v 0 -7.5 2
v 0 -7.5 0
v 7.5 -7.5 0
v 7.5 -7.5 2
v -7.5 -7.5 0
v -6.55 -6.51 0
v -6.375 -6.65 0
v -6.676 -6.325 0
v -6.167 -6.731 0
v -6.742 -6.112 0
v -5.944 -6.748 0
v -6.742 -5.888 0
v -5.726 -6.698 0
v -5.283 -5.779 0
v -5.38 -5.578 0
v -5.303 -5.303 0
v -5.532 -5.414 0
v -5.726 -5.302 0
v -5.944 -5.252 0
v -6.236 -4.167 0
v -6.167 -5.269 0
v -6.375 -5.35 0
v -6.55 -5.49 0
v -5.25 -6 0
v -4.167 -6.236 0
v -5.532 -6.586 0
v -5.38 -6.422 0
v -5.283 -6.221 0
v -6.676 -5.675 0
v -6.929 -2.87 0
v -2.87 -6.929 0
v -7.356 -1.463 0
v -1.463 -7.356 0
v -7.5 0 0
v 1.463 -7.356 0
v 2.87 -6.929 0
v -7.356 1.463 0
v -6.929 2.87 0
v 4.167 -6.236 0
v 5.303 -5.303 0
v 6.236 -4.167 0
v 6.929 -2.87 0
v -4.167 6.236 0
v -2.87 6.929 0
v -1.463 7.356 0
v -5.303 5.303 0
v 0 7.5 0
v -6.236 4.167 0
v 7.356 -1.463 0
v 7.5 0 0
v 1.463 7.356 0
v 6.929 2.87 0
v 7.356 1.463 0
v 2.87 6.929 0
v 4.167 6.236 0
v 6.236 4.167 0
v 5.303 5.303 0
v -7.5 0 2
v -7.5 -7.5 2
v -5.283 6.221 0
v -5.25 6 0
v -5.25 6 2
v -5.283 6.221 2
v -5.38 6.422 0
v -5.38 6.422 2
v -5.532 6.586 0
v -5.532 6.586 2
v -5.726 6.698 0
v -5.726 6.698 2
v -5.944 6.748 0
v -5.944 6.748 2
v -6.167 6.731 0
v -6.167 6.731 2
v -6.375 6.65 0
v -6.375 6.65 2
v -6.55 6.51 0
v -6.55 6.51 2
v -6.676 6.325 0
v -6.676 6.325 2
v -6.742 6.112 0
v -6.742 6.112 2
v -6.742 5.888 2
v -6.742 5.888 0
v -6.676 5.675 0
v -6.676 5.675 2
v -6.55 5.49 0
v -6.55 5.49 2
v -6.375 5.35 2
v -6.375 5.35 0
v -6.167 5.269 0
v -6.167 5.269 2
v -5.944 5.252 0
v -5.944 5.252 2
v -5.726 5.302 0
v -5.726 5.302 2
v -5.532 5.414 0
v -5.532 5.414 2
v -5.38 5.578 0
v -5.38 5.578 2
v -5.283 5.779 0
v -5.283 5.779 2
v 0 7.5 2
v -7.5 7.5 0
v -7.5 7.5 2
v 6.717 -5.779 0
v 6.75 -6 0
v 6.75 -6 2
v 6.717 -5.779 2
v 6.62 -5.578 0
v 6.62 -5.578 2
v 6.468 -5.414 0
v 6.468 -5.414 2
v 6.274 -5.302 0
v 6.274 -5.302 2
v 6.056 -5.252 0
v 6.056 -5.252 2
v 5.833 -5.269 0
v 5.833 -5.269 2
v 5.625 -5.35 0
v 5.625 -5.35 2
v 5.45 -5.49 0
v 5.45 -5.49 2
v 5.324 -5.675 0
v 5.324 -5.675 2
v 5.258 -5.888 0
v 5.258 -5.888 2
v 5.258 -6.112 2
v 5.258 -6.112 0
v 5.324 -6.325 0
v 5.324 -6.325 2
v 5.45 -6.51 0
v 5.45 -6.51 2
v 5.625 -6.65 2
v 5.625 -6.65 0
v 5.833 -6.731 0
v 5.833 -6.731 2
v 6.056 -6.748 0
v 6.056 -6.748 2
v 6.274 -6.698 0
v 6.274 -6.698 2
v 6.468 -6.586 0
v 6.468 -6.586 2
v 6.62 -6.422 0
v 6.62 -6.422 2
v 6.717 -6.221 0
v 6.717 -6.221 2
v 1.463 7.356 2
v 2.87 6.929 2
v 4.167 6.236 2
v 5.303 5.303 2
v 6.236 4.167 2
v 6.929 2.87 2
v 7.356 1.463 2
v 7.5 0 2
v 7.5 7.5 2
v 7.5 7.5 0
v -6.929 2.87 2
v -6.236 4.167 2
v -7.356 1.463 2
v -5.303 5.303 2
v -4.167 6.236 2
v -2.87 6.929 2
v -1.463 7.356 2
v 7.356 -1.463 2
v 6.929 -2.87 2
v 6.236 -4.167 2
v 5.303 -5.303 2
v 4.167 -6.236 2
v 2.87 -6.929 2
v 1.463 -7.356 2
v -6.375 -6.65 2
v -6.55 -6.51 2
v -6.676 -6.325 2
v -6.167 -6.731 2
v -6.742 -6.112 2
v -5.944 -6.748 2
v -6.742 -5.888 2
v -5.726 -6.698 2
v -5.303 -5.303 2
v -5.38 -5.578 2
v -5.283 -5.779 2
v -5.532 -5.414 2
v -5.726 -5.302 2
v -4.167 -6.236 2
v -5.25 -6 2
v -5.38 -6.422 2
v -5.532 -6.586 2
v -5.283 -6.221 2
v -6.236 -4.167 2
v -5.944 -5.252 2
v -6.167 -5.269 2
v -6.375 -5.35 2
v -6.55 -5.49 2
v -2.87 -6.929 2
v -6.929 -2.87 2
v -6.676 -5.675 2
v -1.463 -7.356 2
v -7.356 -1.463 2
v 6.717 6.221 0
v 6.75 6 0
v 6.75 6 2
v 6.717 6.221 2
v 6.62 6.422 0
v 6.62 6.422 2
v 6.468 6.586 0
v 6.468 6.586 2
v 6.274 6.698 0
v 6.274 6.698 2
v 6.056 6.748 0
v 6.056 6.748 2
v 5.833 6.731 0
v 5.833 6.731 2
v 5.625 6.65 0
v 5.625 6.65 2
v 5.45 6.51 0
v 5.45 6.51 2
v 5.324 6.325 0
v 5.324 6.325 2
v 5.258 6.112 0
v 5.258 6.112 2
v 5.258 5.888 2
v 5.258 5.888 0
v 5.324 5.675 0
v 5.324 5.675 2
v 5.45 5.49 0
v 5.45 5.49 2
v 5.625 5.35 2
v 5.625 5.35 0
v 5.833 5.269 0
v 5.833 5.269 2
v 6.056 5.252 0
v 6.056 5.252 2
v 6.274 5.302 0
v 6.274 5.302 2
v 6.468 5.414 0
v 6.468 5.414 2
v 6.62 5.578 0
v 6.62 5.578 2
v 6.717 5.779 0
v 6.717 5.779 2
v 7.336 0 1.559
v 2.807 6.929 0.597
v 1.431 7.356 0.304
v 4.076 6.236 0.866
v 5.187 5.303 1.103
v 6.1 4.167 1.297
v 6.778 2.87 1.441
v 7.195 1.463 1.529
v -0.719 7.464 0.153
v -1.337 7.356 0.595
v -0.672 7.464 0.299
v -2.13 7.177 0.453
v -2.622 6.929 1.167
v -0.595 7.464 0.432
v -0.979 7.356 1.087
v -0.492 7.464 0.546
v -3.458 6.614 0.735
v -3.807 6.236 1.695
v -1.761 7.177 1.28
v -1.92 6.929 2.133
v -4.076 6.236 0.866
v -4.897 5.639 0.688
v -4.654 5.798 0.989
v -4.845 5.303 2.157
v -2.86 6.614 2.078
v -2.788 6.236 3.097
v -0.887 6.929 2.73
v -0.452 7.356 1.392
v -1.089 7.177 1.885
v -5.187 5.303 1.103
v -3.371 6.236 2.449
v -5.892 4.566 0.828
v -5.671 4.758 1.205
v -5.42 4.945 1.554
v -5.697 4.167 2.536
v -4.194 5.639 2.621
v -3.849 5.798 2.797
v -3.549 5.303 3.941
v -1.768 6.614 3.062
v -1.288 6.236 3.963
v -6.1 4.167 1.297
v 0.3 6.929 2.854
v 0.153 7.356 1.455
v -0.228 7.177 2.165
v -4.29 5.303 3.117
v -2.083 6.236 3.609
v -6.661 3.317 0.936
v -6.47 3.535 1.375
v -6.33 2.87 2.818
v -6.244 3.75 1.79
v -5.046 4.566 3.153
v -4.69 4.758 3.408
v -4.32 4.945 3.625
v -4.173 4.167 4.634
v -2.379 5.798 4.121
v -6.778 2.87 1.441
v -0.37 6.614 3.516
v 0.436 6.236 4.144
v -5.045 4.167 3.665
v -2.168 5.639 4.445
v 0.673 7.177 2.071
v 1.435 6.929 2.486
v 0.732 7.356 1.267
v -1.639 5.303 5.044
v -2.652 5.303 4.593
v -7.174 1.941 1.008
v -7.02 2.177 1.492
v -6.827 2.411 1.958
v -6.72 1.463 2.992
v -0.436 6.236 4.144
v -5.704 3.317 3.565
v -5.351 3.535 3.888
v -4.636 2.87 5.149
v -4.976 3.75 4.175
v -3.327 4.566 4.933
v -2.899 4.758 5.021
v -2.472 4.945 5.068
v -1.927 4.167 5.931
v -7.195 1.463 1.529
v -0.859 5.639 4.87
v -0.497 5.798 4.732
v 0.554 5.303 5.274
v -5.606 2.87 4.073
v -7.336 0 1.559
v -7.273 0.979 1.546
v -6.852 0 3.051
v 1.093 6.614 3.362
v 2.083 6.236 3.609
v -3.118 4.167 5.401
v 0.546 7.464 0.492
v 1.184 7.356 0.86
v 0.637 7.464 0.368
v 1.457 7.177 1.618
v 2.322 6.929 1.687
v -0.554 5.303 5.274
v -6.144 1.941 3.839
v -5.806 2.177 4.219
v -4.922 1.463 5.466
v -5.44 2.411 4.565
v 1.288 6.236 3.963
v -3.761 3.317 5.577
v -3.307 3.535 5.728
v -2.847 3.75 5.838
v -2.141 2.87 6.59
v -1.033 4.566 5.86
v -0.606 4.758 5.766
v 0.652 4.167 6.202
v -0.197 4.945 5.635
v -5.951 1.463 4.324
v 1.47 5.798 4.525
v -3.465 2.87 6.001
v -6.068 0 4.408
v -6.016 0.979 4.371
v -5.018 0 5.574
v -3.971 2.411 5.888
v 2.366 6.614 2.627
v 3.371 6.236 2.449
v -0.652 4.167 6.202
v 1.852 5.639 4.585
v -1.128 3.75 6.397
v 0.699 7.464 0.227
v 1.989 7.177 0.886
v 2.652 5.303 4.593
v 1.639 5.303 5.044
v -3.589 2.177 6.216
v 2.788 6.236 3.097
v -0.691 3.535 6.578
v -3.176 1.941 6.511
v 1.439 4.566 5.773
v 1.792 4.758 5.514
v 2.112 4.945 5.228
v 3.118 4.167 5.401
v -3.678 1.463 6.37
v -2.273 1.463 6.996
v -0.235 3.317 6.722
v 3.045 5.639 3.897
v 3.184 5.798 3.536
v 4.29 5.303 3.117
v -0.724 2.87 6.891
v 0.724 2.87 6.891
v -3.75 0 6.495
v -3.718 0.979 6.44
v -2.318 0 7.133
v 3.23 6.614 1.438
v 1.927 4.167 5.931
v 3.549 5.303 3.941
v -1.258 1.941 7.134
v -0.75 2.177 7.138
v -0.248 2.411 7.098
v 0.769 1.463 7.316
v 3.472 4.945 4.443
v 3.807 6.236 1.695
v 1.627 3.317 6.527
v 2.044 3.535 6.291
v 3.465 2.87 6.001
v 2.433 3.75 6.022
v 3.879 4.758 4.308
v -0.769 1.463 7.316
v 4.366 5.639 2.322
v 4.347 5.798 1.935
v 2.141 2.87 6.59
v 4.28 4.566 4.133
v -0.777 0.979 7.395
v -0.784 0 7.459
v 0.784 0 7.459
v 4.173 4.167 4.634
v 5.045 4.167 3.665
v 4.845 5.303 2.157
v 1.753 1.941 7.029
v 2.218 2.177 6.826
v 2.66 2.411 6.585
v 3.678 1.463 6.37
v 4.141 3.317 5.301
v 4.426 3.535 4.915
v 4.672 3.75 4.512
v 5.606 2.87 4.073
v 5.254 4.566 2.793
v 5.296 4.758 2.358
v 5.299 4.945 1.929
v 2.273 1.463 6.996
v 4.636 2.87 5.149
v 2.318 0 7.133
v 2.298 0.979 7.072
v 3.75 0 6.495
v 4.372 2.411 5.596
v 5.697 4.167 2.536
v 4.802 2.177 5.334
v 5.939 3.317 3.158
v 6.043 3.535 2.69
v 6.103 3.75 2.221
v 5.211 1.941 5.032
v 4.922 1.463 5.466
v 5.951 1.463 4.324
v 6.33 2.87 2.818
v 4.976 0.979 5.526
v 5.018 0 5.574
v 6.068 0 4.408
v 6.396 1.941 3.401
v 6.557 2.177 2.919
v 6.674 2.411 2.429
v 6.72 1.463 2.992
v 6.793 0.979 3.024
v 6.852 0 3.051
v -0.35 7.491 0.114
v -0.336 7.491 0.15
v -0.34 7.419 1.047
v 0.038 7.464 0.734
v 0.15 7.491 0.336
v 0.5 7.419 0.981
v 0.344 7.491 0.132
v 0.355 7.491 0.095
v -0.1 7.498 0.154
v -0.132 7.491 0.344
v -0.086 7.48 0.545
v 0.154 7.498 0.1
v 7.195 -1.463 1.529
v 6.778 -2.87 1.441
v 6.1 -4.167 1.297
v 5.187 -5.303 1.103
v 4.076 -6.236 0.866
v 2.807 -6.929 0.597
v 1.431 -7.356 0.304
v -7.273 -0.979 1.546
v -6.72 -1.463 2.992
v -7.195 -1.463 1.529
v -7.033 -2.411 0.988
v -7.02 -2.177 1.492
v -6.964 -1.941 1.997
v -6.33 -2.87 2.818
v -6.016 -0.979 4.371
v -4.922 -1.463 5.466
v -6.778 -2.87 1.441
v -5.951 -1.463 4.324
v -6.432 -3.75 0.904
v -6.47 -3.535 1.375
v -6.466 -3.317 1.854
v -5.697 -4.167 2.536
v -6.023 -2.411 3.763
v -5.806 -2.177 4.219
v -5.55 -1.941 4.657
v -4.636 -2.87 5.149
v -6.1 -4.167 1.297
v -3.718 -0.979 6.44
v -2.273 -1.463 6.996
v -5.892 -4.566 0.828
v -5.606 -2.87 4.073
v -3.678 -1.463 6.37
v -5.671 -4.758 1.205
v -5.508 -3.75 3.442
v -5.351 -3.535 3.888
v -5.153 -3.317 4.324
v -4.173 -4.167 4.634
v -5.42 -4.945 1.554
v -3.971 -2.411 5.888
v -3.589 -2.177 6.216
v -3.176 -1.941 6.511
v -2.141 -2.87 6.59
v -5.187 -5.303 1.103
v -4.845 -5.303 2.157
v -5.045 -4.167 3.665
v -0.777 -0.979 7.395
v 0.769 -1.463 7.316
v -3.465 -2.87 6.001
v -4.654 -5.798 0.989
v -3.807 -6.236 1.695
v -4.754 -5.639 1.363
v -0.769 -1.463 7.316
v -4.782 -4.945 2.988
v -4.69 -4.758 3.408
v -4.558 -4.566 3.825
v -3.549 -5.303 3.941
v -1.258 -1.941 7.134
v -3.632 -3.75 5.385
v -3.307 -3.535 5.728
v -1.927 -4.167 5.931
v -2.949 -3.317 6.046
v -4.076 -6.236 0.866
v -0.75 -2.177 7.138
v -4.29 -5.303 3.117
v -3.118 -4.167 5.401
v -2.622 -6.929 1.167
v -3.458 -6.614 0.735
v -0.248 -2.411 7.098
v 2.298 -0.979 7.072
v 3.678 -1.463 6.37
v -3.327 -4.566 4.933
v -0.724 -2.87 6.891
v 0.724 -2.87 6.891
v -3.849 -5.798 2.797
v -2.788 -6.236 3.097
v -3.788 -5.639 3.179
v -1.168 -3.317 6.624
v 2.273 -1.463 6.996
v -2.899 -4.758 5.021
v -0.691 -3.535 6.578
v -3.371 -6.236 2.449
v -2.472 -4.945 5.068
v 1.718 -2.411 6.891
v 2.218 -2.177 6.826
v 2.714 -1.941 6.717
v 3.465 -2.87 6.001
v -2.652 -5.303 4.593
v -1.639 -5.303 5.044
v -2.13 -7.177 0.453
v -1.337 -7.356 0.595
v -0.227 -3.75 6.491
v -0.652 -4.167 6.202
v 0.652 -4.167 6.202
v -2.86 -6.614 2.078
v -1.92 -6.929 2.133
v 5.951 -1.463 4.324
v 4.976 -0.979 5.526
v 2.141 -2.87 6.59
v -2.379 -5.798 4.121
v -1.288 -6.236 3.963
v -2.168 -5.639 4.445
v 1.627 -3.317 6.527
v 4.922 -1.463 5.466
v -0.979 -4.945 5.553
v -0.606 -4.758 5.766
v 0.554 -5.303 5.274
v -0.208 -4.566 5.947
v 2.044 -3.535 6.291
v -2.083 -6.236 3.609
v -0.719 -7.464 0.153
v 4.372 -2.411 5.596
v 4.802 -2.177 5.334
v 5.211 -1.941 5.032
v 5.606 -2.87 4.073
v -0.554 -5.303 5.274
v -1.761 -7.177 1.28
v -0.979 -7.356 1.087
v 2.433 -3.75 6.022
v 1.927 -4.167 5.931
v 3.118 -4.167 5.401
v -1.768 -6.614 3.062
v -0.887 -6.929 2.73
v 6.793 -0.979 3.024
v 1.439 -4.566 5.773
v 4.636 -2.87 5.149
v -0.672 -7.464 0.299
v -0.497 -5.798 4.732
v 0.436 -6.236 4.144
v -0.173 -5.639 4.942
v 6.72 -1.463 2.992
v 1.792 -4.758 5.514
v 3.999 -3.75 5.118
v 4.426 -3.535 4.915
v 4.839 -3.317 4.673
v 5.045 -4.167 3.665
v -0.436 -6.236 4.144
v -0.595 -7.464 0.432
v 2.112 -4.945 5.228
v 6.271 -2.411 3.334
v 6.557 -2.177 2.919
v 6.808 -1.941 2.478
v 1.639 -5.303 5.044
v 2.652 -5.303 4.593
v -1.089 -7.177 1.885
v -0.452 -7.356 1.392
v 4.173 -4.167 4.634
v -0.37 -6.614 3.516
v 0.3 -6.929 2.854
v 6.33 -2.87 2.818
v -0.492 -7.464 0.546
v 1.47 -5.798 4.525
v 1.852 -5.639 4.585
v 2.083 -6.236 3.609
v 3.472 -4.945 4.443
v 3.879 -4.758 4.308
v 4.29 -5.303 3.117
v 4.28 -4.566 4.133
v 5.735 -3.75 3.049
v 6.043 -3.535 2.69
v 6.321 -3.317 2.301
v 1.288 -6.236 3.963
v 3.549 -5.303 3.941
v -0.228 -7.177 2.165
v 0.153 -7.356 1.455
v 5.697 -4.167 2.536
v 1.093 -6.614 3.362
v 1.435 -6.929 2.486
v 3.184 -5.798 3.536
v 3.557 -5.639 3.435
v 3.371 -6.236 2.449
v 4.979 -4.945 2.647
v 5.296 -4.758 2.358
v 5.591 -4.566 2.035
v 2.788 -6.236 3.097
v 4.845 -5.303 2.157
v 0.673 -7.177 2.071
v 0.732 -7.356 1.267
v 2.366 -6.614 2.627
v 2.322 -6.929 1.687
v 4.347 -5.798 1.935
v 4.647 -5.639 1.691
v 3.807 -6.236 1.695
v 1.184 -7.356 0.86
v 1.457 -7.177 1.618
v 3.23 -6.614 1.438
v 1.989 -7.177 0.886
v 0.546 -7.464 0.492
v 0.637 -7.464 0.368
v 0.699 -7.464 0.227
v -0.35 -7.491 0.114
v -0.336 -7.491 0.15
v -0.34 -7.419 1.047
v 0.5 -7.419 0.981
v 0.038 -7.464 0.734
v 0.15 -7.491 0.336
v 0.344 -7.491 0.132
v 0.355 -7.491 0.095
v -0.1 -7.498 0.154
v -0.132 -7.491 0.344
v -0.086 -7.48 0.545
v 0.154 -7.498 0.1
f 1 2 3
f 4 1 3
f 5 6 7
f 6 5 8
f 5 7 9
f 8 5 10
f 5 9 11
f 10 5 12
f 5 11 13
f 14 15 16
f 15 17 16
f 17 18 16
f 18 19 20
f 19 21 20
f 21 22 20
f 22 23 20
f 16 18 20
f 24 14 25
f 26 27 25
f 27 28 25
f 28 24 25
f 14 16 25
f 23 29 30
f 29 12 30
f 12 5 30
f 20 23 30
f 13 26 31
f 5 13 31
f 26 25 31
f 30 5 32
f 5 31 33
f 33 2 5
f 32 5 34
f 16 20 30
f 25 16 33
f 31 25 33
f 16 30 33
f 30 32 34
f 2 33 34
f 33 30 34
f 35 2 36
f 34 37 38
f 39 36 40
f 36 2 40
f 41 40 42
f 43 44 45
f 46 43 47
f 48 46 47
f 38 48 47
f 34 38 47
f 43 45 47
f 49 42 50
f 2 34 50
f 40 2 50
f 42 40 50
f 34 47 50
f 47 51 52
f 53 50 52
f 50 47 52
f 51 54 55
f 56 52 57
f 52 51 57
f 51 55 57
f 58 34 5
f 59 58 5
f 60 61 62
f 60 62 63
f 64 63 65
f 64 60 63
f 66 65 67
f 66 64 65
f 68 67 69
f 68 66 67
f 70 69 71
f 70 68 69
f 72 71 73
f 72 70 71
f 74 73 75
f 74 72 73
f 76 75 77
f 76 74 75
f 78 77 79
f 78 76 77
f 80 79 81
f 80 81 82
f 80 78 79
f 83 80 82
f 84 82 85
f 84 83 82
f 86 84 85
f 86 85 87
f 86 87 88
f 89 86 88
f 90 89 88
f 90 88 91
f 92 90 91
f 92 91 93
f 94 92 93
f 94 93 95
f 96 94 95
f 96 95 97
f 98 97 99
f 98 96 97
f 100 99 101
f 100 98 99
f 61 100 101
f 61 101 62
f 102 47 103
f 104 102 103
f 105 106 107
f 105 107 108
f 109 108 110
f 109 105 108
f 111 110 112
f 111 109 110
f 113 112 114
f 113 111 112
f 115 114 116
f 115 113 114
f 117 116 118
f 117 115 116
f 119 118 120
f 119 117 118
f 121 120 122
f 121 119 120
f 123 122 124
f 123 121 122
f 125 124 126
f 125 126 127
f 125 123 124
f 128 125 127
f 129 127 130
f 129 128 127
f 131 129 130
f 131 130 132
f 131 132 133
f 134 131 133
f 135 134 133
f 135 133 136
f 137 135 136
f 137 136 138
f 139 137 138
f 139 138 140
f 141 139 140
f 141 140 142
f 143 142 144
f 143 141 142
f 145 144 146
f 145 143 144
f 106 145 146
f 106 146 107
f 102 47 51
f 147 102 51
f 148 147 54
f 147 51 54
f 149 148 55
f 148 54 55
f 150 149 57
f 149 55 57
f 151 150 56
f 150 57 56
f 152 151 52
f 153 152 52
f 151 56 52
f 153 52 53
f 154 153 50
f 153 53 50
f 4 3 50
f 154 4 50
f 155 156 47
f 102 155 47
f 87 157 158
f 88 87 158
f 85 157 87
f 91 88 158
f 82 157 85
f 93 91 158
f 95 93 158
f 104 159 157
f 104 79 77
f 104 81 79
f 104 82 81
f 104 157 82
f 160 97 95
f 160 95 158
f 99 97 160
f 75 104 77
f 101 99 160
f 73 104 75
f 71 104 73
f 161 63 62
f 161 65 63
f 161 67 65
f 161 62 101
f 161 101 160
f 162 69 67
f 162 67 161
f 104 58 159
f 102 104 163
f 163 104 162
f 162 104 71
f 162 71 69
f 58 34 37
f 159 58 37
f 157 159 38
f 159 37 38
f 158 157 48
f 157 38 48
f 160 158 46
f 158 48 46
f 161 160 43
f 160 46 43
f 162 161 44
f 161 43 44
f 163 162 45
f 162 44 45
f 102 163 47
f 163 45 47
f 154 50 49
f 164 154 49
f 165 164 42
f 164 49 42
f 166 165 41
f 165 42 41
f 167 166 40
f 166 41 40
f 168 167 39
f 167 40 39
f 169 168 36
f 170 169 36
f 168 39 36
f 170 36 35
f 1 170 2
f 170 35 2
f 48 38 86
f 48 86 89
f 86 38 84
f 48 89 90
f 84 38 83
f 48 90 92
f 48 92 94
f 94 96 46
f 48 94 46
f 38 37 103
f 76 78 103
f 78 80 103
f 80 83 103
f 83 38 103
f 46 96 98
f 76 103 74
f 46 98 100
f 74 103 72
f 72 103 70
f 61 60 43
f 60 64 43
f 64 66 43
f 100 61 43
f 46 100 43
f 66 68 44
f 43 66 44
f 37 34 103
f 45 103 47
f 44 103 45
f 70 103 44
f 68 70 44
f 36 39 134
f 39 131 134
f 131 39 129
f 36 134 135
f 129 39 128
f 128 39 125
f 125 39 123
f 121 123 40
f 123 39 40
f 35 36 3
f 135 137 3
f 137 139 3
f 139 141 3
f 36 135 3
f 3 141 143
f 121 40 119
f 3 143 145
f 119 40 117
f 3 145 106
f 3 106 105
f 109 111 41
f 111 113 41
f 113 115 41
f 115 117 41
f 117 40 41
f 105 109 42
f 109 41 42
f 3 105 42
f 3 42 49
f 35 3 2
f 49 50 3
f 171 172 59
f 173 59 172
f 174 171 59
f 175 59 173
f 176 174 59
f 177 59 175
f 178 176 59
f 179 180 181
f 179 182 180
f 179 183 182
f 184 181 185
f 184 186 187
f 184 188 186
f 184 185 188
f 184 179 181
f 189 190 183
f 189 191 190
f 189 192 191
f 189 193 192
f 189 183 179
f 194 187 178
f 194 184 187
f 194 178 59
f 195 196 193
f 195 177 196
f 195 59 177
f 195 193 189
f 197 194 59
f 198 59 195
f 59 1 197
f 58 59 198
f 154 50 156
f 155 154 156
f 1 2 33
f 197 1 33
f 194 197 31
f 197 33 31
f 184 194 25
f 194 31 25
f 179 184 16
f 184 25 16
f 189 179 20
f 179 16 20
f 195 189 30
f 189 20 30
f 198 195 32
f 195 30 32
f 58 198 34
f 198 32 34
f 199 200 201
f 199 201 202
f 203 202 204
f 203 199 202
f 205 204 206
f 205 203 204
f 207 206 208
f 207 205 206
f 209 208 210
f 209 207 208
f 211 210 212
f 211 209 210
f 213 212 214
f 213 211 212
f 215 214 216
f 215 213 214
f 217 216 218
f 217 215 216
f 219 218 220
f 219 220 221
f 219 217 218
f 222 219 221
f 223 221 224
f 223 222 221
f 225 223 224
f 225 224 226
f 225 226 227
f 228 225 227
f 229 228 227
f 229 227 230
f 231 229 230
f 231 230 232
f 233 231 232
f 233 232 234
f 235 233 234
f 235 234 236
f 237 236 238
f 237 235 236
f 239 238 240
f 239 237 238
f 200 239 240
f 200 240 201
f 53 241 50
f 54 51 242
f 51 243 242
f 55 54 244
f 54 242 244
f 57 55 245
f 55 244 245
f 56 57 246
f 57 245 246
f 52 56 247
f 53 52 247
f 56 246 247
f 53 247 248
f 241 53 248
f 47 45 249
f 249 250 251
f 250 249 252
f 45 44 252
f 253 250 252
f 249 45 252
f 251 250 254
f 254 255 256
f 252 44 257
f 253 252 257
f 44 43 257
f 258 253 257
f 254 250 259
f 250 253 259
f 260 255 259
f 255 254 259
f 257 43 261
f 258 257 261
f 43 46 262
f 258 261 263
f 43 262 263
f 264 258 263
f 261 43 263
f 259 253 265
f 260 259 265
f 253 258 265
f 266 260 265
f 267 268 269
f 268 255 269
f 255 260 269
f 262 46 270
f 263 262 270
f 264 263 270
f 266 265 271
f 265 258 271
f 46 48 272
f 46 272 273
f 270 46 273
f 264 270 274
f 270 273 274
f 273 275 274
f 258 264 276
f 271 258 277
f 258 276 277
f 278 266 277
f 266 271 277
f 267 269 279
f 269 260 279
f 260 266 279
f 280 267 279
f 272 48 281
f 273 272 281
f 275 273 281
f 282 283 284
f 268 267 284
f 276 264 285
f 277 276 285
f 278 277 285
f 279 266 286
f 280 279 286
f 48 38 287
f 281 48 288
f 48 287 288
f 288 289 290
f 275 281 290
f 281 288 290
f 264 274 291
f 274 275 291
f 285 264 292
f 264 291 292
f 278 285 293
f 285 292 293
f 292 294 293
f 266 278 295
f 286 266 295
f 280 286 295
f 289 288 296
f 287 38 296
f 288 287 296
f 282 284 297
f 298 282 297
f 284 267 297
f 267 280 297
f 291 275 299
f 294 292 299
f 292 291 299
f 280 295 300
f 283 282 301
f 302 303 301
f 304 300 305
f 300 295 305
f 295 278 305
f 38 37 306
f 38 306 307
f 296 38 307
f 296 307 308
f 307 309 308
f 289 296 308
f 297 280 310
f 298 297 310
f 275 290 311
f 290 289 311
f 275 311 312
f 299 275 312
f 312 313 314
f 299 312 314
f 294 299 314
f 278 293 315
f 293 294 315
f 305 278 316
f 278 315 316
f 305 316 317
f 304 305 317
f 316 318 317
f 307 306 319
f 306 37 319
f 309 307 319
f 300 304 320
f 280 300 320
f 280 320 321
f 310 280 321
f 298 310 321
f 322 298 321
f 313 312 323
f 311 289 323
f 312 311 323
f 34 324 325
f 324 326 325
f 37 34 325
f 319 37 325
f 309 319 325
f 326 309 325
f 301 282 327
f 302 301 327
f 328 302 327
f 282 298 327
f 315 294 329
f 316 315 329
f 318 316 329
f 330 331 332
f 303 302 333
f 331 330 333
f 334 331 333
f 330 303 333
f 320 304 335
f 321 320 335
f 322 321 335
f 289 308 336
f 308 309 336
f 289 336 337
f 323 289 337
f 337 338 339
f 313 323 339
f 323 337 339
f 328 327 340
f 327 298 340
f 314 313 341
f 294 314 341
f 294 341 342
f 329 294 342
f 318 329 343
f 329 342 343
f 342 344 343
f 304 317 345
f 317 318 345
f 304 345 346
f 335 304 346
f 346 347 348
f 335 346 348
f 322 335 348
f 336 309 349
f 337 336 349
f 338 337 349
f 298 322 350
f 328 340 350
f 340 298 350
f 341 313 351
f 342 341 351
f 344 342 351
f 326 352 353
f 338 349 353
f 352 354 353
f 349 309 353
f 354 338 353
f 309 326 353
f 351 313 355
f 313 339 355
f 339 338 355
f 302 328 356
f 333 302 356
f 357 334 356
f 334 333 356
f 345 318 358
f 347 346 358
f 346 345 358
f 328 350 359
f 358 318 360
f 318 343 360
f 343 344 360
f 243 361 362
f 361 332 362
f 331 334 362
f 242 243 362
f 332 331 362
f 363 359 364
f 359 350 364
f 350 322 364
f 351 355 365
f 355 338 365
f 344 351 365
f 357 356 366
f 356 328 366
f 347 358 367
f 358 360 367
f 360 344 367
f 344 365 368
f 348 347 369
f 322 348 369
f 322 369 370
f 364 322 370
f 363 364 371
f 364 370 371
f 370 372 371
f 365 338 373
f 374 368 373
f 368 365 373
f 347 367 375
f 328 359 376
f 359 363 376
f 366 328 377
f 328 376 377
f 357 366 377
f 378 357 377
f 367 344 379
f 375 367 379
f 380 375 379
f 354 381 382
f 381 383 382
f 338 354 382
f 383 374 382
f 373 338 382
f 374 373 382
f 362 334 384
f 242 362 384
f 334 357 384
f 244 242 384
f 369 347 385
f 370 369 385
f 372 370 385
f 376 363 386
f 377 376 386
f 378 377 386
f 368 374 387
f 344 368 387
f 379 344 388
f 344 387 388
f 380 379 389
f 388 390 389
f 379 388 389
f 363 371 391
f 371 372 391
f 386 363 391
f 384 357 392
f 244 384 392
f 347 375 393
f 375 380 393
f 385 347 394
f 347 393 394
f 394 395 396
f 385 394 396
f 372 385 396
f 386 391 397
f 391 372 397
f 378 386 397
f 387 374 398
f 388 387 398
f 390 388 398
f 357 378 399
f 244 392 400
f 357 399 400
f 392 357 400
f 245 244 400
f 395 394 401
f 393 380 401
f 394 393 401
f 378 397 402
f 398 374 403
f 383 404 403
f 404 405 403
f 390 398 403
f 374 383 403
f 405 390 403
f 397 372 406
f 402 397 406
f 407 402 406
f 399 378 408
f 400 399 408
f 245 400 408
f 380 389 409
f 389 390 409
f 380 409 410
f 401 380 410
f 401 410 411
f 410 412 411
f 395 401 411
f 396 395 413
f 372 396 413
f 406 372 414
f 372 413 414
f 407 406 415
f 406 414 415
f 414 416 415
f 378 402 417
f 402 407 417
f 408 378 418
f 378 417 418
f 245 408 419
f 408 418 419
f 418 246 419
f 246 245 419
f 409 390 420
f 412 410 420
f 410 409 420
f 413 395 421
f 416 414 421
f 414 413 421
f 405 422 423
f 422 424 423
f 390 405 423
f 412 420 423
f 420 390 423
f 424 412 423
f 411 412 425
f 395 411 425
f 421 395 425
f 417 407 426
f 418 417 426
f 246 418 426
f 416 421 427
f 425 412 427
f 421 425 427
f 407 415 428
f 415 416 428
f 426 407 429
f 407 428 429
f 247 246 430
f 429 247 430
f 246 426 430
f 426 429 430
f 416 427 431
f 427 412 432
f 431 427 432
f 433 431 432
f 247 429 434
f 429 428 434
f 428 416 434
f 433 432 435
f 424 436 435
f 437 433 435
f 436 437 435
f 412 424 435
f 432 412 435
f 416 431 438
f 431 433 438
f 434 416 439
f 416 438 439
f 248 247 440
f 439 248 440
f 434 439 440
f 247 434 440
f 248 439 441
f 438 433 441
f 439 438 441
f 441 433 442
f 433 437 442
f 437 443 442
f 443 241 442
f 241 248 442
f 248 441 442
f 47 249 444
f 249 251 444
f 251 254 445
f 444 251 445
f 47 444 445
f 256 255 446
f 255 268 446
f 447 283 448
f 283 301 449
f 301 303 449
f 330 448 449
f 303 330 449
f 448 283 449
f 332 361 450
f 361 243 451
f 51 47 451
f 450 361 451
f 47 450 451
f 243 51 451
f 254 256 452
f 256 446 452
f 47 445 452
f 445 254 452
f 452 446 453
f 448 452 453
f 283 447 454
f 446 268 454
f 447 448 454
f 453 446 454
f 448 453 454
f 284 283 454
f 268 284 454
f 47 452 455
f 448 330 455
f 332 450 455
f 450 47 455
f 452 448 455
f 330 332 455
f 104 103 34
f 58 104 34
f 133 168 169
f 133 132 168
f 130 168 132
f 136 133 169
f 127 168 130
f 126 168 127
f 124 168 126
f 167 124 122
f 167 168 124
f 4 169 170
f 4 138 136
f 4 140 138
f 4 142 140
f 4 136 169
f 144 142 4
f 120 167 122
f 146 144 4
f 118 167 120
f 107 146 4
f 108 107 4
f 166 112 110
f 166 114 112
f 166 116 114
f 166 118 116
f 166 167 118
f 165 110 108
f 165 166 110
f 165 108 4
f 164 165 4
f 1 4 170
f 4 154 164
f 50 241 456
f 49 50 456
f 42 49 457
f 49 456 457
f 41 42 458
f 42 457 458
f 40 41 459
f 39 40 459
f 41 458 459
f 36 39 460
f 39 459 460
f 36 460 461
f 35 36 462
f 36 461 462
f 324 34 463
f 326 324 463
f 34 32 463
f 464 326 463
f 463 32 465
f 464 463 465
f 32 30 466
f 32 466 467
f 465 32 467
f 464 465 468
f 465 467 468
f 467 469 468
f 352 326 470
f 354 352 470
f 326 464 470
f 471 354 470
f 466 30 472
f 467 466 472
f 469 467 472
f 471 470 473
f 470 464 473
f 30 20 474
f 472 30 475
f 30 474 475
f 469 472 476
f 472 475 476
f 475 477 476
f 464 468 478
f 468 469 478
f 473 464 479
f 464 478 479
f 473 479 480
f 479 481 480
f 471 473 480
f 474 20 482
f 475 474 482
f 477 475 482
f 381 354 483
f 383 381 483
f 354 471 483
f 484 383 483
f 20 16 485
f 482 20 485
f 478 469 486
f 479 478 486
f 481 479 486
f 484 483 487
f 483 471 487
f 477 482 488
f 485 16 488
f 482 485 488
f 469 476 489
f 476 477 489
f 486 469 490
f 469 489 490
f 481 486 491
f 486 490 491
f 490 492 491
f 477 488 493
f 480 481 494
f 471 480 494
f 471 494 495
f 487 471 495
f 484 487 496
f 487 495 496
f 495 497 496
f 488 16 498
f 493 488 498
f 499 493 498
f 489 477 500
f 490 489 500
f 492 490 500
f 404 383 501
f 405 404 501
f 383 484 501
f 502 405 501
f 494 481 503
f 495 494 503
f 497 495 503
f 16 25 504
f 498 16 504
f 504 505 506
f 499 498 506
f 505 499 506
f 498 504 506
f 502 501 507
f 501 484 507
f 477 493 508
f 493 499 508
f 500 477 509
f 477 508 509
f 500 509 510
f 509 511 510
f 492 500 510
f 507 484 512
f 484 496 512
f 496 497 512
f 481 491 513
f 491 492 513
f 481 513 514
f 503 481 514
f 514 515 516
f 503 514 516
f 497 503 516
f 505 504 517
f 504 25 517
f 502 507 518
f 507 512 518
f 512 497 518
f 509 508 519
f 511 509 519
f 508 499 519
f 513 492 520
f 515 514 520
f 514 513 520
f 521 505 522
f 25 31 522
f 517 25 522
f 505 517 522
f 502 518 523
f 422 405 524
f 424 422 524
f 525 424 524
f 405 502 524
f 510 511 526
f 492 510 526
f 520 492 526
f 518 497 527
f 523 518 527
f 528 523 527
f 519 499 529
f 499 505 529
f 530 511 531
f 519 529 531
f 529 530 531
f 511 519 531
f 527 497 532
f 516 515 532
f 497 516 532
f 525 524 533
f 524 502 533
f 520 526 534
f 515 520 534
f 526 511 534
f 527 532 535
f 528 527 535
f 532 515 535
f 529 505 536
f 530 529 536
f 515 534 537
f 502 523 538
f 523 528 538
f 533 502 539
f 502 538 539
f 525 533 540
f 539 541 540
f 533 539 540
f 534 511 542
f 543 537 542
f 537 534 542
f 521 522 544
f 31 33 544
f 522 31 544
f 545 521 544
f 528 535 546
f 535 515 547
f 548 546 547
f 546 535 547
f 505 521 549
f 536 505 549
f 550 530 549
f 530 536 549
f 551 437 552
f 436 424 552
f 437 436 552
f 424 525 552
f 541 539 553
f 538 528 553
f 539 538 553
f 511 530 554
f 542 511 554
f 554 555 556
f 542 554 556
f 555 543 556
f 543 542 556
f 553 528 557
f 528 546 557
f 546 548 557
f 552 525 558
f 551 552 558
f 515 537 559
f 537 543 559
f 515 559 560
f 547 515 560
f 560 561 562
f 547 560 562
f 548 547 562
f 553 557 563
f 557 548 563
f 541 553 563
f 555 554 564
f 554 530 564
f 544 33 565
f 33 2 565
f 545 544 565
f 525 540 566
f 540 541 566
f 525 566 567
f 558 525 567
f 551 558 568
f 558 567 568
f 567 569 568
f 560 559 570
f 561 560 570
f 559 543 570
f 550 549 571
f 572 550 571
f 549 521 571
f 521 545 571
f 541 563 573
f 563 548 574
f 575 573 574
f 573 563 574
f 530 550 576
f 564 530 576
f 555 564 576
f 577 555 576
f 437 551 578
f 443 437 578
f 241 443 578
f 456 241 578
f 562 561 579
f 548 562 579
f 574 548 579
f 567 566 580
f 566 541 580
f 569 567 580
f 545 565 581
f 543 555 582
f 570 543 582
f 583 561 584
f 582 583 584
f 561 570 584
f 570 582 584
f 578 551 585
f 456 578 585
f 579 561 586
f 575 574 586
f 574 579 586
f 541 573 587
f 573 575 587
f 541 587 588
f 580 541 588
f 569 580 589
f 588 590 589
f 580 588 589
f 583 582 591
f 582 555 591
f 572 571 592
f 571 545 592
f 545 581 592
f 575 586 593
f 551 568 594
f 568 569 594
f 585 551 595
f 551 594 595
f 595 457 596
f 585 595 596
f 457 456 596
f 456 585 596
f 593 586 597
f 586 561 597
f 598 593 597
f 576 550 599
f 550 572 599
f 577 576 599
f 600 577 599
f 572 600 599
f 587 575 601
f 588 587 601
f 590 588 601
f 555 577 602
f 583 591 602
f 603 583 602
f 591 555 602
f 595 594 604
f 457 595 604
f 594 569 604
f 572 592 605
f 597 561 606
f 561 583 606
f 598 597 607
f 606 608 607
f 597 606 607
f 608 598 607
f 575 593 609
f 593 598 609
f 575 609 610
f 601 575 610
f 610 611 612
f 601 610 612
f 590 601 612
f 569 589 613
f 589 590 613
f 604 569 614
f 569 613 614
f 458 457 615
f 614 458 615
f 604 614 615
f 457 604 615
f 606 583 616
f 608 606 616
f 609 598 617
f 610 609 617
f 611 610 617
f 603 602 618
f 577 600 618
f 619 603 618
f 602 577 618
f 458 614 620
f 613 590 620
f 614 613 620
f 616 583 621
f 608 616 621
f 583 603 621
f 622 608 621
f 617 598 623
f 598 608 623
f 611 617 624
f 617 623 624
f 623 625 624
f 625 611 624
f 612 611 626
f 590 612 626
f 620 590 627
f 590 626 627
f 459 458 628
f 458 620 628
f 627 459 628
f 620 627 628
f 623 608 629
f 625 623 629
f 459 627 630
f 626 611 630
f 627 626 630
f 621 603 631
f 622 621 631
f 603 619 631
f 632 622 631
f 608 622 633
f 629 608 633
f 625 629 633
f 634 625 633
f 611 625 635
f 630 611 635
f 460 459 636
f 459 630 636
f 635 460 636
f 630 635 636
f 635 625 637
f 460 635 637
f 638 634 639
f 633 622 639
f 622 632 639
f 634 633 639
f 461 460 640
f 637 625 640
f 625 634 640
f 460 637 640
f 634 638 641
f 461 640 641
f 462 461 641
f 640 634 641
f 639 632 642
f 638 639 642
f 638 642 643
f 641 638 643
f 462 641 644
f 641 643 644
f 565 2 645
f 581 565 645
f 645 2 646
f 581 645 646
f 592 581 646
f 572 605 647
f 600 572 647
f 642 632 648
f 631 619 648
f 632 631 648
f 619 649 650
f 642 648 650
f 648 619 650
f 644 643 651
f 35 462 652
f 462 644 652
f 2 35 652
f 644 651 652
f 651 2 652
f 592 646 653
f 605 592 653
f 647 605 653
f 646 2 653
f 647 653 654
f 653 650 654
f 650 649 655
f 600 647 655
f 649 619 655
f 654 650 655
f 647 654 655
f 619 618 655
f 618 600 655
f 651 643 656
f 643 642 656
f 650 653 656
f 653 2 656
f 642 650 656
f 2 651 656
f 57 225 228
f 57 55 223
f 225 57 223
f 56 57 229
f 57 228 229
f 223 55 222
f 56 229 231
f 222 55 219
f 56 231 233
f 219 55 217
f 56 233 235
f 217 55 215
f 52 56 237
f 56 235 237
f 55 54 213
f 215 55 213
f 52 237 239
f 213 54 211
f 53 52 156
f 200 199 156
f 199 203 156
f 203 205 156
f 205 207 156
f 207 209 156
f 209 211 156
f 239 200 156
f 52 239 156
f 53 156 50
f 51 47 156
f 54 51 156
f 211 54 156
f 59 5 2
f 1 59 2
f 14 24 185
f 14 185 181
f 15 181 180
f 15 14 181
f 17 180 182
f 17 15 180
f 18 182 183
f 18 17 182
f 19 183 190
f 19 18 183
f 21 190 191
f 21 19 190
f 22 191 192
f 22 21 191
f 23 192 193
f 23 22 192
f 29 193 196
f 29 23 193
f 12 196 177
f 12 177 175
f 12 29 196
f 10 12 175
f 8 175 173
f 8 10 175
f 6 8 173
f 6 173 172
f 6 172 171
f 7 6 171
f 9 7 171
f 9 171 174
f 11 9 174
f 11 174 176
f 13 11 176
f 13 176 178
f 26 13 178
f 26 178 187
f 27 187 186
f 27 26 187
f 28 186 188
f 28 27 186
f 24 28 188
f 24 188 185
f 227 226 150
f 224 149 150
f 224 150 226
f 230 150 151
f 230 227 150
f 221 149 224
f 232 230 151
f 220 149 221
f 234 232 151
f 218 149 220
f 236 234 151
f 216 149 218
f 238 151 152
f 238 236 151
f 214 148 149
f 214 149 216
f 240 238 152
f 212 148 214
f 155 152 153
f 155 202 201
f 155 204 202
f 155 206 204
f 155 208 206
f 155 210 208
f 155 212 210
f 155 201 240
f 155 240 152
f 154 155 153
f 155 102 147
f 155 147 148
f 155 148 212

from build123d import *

# Parameters (mm, degrees)
F1_ANGLE = -180
F0_R     = 0.75
F2_DEPTH = 2


with BuildPart() as f1:
    # F0 (on Top) → F1 (revolve)
    with BuildSketch(Plane.XY):
        with BuildLine():
            ThreePointArc((-7.5, 0), (-5.303301, -5.303301), (0, -7.5))
            Line((0, -7.5), (0, 7.5))
            ThreePointArc((0, 7.5), (-5.303301, 5.303301), (-7.5, 0))
        make_face()
    revolve(axis=Axis((0, 0, 0), (0, -1, 0)), revolution_arc=F1_ANGLE)

    # F0 (on Top) → F2 (join)
    with BuildSketch(Plane.XY):
        with BuildLine():
            Line((-7.5, 7.5), (-7.5, 0))
            ThreePointArc((-7.5, 0), (-5.303301, 5.303301), (0, 7.5))
            Line((0, 7.5), (-7.5, 7.5))
        make_face()
        with Locations((-6, 6)):
            Circle(F0_R, mode=Mode.SUBTRACT)
        with BuildLine():
            Line((-7.5, -7.5), (0, -7.5))
            ThreePointArc((0, -7.5), (-5.303301, -5.303301), (-7.5, 0))
            Line((-7.5, 0), (-7.5, -7.5))
        make_face()
        with Locations((-6, -6)):
            Circle(F0_R, mode=Mode.SUBTRACT)
        with BuildLine():
            Line((0, -7.5), (7.5, -7.5))
            Line((7.5, -7.5), (7.5, 0))
            ThreePointArc((7.5, 0), (5.303301, -5.303301), (0, -7.5))
        make_face()
        with Locations((6, -6)):
            Circle(F0_R, mode=Mode.SUBTRACT)
        with BuildLine():
            ThreePointArc((0, 7.5), (5.303301, 5.303301), (7.5, 0))
            Line((7.5, 0), (7.5, 7.5))
            Line((7.5, 7.5), (0, 7.5))
        make_face()
        with Locations((6, 6)):
            Circle(F0_R, mode=Mode.SUBTRACT)
    extrude(amount=F2_DEPTH)


solid = f1.part
